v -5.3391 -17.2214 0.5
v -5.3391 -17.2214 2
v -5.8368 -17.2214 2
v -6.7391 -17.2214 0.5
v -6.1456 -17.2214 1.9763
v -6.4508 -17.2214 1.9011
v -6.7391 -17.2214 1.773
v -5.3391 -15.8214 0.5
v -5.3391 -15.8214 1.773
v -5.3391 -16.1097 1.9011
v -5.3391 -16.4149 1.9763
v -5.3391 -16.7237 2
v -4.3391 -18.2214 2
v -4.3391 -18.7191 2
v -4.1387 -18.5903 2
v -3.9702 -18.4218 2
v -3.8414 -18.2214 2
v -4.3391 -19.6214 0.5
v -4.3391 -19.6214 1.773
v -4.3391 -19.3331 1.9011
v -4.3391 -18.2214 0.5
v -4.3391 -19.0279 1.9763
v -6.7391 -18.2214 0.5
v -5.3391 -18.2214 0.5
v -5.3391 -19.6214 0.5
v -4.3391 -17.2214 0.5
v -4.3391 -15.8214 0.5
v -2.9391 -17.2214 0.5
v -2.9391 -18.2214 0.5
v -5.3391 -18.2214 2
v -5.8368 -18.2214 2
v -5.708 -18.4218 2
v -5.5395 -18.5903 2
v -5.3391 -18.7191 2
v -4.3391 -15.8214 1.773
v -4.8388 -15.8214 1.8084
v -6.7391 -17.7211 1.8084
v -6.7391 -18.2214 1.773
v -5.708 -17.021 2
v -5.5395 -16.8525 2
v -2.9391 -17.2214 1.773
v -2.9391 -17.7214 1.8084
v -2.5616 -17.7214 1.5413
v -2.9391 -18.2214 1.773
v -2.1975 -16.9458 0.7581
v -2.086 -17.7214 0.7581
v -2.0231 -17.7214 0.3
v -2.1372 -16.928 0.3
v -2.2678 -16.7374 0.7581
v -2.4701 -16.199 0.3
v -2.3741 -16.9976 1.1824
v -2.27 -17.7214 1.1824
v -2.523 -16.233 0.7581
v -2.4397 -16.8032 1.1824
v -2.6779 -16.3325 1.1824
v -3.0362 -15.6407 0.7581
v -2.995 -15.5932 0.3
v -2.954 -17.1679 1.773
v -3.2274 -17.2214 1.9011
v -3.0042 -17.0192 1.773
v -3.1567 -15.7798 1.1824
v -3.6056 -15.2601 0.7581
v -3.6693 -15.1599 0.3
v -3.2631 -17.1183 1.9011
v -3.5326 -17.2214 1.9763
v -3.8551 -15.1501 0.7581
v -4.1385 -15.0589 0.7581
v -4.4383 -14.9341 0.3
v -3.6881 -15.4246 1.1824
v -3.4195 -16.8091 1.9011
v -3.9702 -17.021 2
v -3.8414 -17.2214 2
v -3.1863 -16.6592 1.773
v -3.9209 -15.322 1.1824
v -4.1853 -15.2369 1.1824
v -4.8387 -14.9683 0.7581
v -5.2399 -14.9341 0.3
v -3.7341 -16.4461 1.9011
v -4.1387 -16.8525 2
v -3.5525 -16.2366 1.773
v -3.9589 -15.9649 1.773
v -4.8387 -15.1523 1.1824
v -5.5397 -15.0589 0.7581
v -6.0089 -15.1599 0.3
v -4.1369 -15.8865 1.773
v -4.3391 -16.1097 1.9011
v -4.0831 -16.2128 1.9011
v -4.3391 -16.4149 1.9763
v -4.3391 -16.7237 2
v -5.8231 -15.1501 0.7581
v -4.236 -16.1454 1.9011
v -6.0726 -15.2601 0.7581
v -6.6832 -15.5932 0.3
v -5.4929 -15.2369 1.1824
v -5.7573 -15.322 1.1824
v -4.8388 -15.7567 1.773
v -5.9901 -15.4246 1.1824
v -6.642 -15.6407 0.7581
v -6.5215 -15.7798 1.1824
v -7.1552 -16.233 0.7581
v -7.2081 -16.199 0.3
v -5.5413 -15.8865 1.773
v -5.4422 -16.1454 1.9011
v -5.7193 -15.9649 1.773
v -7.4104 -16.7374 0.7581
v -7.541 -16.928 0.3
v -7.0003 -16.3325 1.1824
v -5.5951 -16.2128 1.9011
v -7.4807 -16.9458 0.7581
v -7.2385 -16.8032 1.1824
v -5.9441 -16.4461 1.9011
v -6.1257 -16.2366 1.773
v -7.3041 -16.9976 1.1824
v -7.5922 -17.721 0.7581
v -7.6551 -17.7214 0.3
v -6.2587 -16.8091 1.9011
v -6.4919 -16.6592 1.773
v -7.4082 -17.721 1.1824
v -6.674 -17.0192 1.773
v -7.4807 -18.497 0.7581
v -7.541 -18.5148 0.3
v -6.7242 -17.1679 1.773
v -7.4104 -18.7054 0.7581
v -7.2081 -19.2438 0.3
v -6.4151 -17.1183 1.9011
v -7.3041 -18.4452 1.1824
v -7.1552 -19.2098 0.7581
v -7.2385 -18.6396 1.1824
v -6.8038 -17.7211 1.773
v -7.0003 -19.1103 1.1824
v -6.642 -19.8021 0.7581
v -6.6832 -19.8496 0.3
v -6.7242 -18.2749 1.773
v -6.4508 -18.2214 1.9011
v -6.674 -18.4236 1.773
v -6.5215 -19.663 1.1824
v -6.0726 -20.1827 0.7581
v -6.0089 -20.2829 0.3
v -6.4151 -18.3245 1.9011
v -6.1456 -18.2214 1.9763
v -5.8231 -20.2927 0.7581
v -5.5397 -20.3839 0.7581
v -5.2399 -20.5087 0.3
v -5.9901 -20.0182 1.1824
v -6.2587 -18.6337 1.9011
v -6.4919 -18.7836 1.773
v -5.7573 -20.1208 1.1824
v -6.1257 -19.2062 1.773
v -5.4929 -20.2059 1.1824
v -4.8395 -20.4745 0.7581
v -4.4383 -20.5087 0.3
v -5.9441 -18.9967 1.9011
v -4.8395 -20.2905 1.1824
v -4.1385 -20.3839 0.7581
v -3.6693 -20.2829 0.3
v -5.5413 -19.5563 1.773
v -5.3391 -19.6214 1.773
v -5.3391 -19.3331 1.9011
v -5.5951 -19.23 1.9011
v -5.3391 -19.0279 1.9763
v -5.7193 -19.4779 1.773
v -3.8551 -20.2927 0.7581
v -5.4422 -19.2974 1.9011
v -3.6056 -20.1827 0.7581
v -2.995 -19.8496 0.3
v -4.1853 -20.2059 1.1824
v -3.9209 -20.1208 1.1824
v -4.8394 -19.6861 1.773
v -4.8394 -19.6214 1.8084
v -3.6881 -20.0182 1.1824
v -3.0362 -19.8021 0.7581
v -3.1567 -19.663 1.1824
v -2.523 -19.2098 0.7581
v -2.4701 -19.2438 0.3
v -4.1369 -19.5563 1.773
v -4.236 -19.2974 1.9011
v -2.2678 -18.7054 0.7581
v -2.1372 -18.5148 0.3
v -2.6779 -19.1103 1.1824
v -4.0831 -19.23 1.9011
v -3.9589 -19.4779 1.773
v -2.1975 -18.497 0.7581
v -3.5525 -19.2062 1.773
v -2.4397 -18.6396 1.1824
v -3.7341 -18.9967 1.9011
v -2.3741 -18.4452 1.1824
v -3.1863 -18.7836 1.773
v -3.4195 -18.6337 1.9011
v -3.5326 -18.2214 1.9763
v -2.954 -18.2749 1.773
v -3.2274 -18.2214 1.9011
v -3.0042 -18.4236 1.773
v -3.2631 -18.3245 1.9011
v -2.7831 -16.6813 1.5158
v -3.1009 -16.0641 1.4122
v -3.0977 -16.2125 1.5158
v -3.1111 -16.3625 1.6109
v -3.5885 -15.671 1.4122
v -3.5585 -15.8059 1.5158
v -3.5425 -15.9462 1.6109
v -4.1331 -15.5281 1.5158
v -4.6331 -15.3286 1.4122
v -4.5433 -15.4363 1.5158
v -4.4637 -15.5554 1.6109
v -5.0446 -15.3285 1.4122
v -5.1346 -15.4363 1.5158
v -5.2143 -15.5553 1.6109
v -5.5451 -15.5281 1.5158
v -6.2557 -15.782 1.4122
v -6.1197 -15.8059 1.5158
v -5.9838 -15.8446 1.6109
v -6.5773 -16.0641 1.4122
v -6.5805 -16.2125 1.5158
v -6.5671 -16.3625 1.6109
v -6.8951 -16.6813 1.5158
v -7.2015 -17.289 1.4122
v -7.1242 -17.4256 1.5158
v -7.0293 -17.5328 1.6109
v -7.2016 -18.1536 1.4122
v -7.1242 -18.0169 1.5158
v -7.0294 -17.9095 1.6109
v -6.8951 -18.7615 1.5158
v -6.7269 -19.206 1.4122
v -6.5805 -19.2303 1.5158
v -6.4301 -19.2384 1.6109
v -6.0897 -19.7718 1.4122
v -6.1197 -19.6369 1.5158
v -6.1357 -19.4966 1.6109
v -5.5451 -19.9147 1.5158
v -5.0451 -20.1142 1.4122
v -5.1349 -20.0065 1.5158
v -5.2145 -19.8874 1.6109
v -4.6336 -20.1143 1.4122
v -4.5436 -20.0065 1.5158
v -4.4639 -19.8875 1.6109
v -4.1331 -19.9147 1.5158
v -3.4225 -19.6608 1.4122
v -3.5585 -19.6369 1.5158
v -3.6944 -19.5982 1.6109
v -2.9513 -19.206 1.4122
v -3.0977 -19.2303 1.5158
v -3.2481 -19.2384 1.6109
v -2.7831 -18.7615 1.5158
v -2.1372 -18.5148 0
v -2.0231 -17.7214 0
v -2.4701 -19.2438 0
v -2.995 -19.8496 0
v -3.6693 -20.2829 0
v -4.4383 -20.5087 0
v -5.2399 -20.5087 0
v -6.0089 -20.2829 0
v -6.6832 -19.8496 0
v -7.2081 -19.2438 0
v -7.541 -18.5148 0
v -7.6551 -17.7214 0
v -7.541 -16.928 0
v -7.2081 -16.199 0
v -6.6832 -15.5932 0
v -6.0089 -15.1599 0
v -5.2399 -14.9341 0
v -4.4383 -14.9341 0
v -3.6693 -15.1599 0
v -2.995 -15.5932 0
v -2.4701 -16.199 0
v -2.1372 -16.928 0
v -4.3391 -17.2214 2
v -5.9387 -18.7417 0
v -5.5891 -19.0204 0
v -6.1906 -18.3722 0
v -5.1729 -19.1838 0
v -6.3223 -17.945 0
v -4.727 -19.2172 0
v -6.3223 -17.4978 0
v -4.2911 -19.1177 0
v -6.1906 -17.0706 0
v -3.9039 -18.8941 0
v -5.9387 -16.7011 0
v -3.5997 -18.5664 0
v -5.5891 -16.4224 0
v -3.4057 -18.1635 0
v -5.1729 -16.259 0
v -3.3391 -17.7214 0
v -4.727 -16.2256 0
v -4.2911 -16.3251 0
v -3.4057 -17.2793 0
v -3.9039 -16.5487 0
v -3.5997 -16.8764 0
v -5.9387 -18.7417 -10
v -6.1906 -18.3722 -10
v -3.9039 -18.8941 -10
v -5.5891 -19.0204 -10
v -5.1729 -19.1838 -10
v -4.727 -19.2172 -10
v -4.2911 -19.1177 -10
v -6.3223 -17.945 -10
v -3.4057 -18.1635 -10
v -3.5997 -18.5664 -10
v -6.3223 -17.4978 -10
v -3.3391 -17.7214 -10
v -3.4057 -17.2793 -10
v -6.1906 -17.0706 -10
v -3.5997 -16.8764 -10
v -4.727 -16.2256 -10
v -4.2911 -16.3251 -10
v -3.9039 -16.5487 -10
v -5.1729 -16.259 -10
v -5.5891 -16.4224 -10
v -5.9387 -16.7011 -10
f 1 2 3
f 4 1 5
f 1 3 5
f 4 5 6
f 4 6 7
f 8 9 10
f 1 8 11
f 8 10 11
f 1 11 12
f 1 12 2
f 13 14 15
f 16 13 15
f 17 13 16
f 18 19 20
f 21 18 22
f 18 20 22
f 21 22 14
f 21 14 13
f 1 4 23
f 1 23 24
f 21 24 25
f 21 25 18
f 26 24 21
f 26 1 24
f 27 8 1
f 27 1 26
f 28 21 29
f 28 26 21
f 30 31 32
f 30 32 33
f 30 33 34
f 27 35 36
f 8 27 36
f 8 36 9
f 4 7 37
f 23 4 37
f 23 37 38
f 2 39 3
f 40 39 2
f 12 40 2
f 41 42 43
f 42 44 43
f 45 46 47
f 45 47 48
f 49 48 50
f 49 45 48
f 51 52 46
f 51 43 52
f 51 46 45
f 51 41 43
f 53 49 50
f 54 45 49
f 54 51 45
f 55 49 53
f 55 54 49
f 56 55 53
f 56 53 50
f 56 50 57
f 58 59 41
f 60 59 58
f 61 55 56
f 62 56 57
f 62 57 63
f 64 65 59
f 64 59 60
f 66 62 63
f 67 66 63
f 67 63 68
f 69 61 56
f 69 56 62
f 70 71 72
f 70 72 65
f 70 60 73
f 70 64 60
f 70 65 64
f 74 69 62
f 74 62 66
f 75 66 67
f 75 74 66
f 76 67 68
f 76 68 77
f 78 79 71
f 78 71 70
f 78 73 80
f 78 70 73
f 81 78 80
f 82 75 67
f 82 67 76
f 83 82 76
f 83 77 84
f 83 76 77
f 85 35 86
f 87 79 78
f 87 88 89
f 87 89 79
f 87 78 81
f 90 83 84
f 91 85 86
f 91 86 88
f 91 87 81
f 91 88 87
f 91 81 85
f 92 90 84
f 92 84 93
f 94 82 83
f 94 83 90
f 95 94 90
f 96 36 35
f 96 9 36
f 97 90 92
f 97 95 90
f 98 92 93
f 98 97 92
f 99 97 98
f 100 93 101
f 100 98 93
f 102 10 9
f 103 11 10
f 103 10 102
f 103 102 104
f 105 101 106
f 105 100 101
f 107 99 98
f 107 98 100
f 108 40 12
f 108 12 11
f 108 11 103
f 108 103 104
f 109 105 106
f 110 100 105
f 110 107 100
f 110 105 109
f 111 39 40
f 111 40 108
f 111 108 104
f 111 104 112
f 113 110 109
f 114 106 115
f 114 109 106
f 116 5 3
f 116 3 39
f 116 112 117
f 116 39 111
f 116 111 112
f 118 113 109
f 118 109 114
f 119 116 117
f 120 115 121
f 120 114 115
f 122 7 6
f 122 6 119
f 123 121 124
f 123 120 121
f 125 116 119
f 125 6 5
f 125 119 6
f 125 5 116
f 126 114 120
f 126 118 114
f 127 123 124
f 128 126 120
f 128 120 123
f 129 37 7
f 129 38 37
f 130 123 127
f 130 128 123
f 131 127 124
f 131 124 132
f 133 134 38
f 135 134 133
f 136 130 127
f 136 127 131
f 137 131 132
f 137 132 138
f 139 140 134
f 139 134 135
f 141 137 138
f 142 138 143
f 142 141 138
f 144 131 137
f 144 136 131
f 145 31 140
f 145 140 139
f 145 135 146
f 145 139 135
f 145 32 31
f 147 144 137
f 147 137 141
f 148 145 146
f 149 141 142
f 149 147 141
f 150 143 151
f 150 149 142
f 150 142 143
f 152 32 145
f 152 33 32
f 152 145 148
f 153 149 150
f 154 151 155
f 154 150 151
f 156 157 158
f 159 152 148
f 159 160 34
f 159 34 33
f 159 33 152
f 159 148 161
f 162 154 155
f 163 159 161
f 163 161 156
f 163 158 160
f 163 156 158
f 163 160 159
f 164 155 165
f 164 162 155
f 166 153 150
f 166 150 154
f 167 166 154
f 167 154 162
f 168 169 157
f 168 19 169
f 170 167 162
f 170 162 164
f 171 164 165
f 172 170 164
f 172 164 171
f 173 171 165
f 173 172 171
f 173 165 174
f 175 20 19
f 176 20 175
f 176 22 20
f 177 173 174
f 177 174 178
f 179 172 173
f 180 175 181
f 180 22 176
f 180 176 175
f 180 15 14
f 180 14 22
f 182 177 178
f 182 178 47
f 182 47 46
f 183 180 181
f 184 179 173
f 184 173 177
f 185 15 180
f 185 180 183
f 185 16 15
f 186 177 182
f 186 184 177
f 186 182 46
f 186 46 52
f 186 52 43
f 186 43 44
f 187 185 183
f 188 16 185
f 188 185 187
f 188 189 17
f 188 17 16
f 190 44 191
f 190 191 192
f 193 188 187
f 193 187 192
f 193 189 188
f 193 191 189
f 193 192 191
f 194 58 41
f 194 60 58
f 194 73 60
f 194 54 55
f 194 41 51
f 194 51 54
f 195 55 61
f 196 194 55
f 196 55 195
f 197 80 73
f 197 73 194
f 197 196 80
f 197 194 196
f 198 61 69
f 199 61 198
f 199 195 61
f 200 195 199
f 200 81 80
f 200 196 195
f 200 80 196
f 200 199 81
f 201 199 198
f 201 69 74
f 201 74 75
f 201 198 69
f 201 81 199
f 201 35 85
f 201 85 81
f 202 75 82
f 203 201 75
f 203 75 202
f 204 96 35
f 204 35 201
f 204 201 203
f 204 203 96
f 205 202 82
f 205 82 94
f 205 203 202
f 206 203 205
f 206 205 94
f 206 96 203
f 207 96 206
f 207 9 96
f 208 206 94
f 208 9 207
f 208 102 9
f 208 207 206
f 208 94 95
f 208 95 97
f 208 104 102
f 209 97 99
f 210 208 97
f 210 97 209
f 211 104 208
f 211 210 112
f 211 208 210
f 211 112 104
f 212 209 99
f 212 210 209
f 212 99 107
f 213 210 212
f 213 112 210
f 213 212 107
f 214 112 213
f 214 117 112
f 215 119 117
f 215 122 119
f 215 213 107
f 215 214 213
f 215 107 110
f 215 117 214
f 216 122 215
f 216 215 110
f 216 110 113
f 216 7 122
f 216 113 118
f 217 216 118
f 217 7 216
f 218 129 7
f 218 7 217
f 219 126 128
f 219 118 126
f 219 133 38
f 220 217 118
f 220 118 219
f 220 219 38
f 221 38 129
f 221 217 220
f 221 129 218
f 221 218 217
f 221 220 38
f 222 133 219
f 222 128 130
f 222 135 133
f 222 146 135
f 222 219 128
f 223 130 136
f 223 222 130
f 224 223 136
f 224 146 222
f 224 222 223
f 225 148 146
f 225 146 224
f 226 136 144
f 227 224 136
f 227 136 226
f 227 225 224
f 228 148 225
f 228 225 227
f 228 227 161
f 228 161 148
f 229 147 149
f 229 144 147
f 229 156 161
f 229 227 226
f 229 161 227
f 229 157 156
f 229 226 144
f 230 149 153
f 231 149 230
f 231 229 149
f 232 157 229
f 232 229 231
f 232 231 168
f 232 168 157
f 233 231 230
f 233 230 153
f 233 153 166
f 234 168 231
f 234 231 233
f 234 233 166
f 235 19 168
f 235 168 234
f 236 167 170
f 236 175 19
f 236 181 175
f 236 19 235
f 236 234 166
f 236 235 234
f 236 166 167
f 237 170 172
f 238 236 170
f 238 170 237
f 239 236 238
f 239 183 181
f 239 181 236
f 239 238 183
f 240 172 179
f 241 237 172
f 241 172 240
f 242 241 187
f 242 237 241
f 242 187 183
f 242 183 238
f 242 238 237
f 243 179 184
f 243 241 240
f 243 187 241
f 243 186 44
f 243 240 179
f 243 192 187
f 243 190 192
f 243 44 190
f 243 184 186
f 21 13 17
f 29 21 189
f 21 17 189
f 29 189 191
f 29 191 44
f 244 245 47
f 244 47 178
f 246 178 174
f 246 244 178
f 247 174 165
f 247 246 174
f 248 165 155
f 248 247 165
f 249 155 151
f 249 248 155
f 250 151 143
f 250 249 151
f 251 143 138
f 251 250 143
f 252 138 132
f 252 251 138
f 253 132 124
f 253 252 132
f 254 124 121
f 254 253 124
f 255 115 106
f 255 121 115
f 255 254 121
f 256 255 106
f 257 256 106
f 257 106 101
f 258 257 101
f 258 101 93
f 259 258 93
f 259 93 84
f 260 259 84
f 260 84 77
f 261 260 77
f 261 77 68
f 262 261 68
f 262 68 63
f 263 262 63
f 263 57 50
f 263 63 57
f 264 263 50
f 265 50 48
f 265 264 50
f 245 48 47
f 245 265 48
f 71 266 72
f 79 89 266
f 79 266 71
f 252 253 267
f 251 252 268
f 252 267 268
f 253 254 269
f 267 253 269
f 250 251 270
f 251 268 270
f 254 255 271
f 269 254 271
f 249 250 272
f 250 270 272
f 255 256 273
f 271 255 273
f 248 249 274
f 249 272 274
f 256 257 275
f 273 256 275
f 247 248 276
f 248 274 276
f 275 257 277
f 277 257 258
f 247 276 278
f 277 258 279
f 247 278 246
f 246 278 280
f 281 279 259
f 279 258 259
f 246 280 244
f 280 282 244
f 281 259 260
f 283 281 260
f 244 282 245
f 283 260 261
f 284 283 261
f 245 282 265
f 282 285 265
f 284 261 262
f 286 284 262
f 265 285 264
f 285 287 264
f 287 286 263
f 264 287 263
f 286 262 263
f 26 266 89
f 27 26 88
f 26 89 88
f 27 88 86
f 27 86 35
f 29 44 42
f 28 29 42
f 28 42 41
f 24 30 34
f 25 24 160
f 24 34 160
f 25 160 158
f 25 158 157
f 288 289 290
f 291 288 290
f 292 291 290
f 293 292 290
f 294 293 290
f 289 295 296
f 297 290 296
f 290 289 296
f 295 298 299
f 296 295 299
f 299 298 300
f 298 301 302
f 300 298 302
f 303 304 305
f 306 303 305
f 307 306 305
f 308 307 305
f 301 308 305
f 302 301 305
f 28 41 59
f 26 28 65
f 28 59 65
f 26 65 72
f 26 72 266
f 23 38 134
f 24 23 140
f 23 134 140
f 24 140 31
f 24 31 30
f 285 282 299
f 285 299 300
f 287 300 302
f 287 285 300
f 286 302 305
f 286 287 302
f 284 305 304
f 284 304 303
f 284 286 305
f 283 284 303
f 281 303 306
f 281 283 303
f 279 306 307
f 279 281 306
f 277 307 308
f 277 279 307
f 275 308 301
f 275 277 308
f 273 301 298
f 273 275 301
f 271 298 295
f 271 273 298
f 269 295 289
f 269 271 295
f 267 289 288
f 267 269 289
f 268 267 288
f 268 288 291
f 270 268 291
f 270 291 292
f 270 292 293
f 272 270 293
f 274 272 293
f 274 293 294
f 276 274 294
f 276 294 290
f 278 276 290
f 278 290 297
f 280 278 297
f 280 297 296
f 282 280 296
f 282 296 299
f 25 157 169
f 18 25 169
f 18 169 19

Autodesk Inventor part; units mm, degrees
ref_plane "YZ Plane" through (0, 0, 0) normal (1, 0, 0) x (0, 1, 0)
ref_plane "XZ Plane" through (0, 0, 0) normal (0, 1, 0) x (-1, 0, 0)
ref_plane "XY Plane" through (0, 0, 0) normal (0, 0, 1) x (1, 0, 0)
sketch "Эскиз1" plane through (0, 0, 0) normal (0, 0, 1) x (1, 0, 0)
  circle A0 centre (-4.8391, -17.7214) radius 1.5
  point P0 (0, 0)
extrude "Выдавливание1" add sketch "Эскиз1" against normal blind 10
sketch "Эскиз2" plane through (-4.8391, -17.7214, 0) normal (0, 0, 1) x (1, 0, 0)
  circle A0 centre (0, 0) radius 2.816
  point P0 (4.8391, 17.7214)
extrude "Выдавливание2" add sketch "Эскиз2" along normal blind 2
fillet "Сопряжение1" radius 1.7 1 edges at (-7.6551, -17.7214, 2)
sketch "Эскиз3" plane through (-4.8391, -17.7214, 2) normal (0, 0, 1) x (1, 0, 0)
  line L0 (-0.5, -1.9) -> (0.5, -1.9)
  line L1 (0.5, 1.9) -> (-0.5, 1.9)
  line L2 (1.9, -0.5) -> (1.9, 0.5)
  line L3 (-1.9, 0.5) -> (-1.9, -0.5)
  line L4 (-0.5, 1.9) -> (-0.5, 0.5)
  line L5 (-0.5, -0.5) -> (-0.5, -1.9)
  line L6 (1.9, 0.5) -> (0.5, 0.5)
  line L7 (-0.5, 0.5) -> (-1.9, 0.5)
  line L8 (0.5, -1.9) -> (0.5, -0.5)
  line L9 (0.5, 0.5) -> (0.5, 1.9)
  line L10 (-1.9, -0.5) -> (-0.5, -0.5)
  line L11 (0.5, -0.5) -> (1.9, -0.5)
  point P0 (4.8391, 17.7214)
  point P1 (0, 0)
extrude "Выдавливание3" cut sketch "Эскиз3" against normal blind 1.5
thread "Резьба1" size "M3x0.5" class "6g" standard "ANSI Metric M Profile" full length
properties part number "Винт М3х10"
